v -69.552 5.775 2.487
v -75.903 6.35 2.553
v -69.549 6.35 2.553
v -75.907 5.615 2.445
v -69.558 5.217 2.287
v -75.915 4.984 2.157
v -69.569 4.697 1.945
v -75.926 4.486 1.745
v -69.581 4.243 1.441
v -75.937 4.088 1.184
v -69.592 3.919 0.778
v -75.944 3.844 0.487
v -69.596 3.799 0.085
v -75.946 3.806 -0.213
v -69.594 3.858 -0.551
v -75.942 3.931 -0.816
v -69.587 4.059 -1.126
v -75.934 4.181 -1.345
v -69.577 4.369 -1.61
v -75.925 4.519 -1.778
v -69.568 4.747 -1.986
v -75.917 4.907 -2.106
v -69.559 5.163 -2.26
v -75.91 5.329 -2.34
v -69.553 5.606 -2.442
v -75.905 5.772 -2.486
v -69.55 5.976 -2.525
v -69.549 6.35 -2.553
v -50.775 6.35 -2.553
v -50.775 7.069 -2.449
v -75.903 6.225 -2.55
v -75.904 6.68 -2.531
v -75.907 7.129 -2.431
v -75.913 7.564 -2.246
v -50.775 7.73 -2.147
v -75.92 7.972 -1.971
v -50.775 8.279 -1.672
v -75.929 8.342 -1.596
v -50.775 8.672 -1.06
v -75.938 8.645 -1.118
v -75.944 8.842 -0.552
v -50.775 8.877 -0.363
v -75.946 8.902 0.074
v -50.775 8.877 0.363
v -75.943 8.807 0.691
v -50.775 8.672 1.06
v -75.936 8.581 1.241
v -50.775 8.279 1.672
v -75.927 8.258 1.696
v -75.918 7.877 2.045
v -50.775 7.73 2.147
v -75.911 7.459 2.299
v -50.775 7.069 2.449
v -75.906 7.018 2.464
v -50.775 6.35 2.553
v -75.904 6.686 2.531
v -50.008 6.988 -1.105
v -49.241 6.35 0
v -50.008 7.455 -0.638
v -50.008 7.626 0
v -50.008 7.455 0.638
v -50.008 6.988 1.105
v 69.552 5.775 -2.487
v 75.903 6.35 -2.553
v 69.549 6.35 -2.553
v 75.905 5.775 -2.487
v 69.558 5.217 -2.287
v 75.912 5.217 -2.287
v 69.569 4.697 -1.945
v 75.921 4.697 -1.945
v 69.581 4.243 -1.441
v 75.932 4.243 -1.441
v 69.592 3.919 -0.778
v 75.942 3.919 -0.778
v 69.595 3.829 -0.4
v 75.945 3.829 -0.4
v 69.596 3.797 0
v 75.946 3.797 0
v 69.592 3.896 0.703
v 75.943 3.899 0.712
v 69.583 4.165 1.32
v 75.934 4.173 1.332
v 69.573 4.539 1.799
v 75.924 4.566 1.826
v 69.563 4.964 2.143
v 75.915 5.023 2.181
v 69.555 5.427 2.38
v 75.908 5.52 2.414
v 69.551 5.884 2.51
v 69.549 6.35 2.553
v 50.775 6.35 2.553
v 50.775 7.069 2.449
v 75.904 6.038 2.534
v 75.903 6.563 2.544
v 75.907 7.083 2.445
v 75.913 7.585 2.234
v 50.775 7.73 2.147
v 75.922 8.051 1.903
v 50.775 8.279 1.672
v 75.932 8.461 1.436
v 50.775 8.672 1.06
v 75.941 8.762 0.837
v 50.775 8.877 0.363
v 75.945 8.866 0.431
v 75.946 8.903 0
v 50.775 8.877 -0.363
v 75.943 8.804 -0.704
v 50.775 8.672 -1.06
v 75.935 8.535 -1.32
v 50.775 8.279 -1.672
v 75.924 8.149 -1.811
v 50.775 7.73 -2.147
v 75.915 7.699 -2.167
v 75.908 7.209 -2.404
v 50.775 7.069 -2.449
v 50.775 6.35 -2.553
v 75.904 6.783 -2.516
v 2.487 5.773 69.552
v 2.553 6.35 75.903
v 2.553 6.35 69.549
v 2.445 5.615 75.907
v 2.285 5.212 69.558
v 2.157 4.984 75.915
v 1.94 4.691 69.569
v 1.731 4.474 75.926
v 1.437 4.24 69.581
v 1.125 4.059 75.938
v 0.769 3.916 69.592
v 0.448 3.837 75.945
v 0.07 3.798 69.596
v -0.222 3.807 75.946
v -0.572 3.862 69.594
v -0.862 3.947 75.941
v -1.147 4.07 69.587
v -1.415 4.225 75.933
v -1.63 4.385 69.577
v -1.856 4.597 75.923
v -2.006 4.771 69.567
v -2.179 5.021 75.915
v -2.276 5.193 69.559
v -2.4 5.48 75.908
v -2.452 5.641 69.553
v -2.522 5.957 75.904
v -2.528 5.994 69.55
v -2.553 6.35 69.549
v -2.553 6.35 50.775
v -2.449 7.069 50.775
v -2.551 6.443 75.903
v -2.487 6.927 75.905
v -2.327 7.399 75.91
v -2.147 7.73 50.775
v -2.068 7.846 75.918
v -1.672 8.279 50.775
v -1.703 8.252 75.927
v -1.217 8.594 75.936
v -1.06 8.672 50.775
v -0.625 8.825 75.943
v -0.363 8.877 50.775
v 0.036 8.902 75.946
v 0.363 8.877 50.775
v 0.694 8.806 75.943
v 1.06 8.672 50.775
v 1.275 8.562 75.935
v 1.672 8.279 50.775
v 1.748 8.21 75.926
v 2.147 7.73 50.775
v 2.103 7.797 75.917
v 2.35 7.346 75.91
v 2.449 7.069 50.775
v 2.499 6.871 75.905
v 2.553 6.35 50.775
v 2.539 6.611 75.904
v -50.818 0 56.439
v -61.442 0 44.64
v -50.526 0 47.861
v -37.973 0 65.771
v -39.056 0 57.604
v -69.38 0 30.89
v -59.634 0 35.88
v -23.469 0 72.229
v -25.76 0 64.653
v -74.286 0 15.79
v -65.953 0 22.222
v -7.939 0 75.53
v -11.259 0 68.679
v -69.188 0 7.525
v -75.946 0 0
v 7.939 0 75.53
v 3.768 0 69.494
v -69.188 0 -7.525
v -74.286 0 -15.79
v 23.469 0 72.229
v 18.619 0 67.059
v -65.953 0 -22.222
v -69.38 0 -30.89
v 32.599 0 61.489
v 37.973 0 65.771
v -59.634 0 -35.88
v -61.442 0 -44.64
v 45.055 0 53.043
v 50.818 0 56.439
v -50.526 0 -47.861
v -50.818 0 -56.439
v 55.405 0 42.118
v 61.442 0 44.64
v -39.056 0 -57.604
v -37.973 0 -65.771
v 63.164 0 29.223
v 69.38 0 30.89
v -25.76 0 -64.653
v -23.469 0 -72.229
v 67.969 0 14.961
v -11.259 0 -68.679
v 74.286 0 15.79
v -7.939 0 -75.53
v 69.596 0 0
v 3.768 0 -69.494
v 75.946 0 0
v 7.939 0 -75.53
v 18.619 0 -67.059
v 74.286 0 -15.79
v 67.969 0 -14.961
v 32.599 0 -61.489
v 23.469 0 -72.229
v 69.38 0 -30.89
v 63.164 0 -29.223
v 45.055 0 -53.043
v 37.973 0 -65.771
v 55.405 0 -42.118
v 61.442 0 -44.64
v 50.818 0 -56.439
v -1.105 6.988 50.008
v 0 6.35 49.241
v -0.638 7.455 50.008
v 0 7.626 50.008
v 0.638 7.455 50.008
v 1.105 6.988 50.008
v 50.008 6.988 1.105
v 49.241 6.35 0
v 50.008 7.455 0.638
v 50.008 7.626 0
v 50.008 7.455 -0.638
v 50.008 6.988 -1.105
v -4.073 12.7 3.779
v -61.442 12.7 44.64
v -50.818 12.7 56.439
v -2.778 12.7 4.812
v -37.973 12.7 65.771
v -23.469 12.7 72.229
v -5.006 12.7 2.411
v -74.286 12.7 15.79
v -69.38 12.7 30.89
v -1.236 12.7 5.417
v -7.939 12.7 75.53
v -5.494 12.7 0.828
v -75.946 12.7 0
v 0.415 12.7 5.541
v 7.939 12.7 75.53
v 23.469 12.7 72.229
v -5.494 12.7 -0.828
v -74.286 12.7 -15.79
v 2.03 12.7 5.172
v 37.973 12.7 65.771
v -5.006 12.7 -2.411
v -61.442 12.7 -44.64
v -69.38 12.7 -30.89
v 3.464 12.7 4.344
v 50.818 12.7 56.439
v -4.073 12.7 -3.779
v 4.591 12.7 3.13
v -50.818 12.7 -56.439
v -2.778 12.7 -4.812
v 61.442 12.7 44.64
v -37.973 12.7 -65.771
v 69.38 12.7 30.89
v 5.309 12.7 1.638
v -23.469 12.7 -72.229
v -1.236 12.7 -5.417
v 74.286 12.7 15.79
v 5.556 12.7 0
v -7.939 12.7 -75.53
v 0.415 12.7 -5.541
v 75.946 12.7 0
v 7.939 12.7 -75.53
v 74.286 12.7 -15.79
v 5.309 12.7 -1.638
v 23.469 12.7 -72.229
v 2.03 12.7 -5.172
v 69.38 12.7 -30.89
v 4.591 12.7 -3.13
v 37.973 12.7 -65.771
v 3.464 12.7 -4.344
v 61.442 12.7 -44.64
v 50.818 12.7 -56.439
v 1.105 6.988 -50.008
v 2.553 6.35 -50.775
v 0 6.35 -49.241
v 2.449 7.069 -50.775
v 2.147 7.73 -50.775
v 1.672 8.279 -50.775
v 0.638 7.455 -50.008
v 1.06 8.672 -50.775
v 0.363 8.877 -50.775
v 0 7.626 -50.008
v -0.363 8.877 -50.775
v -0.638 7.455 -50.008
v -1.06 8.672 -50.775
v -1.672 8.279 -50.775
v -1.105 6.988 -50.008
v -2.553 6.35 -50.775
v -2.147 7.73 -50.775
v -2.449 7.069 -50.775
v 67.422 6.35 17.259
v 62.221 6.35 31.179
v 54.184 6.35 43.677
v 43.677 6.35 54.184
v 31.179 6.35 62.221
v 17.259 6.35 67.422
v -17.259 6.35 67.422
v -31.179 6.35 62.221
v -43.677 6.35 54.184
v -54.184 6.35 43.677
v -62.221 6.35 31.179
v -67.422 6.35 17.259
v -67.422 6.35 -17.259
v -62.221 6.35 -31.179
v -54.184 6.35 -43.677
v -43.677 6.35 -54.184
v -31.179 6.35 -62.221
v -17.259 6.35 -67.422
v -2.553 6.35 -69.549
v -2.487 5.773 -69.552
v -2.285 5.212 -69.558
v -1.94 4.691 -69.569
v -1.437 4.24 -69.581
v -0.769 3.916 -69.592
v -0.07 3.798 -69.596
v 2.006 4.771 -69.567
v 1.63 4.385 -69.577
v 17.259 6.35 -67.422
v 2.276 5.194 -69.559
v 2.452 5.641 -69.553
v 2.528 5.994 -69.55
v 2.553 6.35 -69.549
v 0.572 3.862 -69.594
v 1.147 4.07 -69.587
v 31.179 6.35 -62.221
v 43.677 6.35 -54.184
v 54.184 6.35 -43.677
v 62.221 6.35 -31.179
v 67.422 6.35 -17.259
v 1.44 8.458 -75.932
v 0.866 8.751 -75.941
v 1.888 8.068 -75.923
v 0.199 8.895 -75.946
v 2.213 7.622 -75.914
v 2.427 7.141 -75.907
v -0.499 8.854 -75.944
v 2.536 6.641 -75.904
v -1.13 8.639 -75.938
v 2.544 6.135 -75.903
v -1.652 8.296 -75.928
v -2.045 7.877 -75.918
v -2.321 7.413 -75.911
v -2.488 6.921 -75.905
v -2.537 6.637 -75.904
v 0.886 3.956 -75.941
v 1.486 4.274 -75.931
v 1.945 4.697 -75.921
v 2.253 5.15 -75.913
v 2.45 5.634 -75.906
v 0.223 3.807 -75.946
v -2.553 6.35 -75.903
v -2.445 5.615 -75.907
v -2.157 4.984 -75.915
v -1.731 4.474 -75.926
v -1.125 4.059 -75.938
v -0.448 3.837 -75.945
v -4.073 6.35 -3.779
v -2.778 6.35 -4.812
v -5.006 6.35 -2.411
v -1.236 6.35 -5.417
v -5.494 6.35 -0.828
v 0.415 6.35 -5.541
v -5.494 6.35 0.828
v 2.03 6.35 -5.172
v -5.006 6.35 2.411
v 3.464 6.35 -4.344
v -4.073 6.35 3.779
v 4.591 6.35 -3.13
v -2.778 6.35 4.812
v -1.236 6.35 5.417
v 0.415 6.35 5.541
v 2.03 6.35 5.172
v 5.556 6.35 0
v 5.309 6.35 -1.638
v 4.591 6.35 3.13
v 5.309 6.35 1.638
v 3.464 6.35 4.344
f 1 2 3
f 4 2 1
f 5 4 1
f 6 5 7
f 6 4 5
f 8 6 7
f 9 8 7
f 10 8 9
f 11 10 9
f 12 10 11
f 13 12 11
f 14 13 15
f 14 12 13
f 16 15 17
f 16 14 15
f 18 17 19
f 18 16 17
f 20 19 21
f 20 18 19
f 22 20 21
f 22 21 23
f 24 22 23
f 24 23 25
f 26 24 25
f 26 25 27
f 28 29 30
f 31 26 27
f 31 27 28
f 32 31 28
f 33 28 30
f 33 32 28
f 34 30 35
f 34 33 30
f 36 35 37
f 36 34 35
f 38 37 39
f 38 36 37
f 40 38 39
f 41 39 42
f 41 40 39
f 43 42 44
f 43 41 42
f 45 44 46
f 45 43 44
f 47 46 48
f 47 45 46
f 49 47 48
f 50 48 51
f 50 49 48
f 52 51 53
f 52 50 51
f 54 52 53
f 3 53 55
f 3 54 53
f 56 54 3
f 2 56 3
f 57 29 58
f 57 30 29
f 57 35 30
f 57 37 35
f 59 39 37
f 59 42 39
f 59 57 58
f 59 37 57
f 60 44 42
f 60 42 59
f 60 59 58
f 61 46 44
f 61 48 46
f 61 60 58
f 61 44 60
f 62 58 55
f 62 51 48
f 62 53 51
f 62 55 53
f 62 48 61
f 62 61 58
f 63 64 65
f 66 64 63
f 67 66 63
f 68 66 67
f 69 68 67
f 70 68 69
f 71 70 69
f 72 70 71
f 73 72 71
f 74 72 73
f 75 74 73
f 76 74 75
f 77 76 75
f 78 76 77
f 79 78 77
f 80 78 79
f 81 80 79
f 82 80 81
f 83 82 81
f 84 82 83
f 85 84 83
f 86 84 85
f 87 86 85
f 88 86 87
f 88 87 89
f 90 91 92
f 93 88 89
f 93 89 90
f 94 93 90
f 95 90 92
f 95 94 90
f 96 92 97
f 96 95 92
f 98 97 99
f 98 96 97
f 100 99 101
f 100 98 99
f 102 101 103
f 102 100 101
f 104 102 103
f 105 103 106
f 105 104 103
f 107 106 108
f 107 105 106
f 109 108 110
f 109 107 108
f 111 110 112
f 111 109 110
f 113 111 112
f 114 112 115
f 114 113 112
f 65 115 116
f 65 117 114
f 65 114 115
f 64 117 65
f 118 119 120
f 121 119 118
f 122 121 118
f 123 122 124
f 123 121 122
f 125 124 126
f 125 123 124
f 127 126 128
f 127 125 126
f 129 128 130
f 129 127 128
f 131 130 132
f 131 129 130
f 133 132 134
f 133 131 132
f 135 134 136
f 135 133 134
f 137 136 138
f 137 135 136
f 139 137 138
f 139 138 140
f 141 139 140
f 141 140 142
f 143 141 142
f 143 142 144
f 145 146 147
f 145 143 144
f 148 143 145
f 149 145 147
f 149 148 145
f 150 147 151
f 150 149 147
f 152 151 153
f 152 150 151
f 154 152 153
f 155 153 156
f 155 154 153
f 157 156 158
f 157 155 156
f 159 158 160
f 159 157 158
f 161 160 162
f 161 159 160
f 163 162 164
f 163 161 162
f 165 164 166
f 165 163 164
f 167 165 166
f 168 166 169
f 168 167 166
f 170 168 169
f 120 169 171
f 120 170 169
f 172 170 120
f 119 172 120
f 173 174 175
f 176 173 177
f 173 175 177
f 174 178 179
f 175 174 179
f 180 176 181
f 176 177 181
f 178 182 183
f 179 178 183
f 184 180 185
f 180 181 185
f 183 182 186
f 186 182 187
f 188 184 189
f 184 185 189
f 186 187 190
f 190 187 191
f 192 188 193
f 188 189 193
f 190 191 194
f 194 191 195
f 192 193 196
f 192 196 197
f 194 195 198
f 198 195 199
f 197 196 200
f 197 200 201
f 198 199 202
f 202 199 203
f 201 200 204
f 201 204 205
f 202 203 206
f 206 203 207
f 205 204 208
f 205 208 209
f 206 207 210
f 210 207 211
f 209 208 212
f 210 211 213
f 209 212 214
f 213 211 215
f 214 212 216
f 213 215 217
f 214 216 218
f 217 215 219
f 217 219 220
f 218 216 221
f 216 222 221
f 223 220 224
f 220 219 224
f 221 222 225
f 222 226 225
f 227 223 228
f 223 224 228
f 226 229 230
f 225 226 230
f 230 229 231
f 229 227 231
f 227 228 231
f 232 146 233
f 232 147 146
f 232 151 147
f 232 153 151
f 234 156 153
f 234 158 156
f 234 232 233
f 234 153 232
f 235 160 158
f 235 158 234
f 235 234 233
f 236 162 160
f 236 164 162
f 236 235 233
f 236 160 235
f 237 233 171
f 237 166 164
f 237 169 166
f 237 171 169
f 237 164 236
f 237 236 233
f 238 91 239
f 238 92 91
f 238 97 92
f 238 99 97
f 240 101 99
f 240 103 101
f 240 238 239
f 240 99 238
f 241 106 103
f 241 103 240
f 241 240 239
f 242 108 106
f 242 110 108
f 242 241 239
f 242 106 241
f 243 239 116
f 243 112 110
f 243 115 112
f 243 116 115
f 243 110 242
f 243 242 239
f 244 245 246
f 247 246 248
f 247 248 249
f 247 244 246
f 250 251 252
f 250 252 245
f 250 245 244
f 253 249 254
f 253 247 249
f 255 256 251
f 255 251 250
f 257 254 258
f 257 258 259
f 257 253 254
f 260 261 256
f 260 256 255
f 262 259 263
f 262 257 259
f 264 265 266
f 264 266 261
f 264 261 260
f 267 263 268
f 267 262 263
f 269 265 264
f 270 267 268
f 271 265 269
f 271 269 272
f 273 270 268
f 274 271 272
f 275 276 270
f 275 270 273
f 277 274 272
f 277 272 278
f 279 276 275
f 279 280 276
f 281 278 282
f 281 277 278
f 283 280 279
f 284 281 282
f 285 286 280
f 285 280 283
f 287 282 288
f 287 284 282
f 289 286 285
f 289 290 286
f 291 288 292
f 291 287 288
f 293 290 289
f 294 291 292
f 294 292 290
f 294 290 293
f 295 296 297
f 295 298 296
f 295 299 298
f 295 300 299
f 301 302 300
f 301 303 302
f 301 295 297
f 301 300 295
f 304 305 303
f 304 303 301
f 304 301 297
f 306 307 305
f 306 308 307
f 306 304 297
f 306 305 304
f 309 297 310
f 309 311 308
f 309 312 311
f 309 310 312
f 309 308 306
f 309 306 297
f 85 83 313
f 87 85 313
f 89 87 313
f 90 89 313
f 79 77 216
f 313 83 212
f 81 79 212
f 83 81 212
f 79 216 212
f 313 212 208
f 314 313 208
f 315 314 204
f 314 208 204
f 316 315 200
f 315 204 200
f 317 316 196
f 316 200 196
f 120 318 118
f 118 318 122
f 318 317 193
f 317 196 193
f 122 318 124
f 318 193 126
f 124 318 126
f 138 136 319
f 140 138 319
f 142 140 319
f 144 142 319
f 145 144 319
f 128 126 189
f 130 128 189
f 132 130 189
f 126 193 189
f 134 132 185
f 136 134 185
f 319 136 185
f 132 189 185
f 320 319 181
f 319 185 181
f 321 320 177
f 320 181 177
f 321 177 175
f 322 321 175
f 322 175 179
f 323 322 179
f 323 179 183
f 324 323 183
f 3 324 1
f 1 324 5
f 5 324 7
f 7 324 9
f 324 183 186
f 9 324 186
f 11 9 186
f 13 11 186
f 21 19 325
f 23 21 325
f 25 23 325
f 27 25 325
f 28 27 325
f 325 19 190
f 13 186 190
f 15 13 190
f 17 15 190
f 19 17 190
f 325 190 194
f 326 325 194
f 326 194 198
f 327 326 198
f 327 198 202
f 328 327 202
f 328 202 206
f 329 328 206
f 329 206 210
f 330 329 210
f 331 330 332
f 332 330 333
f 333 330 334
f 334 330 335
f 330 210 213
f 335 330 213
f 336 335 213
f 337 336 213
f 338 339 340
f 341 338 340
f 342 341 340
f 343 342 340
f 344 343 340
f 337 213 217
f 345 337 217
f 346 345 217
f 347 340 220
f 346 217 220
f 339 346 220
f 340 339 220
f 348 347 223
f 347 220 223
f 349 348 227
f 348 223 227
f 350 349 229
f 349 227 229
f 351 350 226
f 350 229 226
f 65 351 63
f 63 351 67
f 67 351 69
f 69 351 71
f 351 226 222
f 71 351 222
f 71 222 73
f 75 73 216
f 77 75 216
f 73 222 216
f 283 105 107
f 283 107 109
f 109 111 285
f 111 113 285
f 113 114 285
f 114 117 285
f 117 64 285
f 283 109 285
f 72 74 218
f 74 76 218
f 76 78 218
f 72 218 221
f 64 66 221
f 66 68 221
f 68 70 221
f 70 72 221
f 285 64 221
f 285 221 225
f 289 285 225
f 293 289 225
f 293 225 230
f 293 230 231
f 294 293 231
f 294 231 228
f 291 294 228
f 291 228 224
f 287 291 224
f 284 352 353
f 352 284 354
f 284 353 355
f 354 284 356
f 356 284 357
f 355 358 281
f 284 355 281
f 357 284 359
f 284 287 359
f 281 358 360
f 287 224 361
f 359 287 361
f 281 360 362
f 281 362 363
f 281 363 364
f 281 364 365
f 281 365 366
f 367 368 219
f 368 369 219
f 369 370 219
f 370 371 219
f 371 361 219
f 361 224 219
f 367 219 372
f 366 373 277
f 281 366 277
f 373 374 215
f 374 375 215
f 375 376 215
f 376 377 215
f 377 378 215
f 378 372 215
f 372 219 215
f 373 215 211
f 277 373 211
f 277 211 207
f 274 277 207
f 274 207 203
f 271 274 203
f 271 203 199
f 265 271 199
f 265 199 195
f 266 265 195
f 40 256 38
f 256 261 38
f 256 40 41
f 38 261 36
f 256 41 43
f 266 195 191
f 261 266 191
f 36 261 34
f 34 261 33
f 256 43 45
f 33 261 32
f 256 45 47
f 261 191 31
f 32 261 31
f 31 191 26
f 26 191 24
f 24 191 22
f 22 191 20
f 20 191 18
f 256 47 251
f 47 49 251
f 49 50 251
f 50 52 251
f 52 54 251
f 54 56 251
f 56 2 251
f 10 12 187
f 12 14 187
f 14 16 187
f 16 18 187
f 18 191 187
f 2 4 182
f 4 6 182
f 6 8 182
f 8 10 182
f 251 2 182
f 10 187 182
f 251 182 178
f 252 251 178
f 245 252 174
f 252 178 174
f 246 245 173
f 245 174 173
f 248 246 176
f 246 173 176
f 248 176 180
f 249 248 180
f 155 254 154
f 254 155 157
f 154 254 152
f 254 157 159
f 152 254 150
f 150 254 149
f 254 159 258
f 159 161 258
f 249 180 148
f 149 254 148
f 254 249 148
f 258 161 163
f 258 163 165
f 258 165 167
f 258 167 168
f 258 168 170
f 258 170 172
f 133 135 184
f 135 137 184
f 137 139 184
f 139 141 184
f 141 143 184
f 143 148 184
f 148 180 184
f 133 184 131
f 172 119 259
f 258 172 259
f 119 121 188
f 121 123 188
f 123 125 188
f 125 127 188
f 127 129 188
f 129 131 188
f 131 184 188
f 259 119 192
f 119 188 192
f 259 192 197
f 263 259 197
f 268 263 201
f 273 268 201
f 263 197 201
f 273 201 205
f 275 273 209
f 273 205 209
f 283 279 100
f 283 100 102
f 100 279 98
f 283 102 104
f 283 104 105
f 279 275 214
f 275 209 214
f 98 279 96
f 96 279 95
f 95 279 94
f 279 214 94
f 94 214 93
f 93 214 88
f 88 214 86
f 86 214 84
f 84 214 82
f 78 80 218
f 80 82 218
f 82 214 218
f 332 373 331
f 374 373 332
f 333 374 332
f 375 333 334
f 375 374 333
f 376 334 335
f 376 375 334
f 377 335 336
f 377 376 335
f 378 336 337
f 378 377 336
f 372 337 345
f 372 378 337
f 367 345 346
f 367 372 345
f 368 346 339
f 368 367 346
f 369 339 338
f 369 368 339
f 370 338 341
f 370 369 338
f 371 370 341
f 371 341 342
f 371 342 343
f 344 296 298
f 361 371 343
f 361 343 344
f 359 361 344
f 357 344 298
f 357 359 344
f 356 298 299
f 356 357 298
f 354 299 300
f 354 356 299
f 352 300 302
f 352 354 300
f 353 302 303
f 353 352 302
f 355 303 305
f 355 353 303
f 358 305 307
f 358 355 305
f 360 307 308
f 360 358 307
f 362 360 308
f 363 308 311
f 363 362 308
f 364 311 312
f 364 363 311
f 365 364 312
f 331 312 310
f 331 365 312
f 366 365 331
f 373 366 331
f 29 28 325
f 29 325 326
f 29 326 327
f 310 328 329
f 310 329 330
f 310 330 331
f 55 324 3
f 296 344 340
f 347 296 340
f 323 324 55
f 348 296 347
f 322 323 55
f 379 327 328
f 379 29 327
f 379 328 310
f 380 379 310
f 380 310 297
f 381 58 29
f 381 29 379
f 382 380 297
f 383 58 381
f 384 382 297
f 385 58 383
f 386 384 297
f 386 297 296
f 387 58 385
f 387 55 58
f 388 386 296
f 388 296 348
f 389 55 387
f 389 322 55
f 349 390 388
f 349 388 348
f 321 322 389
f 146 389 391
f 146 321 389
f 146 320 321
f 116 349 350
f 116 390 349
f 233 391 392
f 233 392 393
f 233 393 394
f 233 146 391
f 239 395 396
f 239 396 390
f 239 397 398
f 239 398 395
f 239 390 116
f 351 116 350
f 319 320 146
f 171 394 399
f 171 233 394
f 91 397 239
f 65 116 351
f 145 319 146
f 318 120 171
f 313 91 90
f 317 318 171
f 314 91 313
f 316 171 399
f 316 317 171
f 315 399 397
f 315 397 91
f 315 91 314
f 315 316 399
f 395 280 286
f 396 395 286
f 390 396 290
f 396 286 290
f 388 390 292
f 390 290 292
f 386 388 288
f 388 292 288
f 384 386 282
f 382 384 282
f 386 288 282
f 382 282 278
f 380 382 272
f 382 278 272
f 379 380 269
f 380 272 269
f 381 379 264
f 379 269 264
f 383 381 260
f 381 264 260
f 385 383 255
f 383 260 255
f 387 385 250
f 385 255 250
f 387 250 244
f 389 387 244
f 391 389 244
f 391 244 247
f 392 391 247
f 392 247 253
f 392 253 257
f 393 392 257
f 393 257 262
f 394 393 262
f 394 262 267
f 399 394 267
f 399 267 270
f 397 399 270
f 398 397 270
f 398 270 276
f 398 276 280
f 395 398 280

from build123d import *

# Parameters (mm, degrees)
SKETCH2_R               = 75.946
BOSS_EXTRUDE1_DEPTH     = 12.7
SKETCH3_R               = 5.55625
CUT_EXTRUDE1_DEPTH      = 1
CUT_EXTRUDE1_DEPTH_BACK = 13.7
CIRPATTERN2_COUNT       = 4
CIRPATTERN2_ANGLE       = 270
SKETCH11_R              = 69.596
CUT_EXTRUDE2_DEPTH      = 6.35


with BuildPart() as part:
    # Sketch2 → Boss-Extrude1 (new body)
    with BuildSketch(Plane(origin=(0, 0, 0), x_dir=(1, 0, 0), z_dir=(0, 1, 0))):
        Circle(SKETCH2_R)
    extrude(amount=BOSS_EXTRUDE1_DEPTH)

    # Sketch3 → Cut-Extrude1 (cut, two sides)
    with BuildSketch(Plane(origin=(0, 12.7, 0), x_dir=(1, 0, 0), z_dir=(0, 1, 0))) as cut_extrude1_sk:
        Circle(SKETCH3_R)
    extrude(amount=CUT_EXTRUDE1_DEPTH, mode=Mode.SUBTRACT)
    extrude(cut_extrude1_sk.sketch, amount=-CUT_EXTRUDE1_DEPTH_BACK, mode=Mode.SUBTRACT)

    # Sketch10 → 1_4-20 Tapped Hole1 (revolve, cut)
    with BuildSketch(Plane(origin=(-76.1746, 6.35, 0), x_dir=(0, 0, 1), z_dir=(0, 1, 0))):
        Polygon((0, 0), (0, 26.933816902), (2.5527, 25.4), (2.5527, 0), align=None)
    f_1_4_20_tapped_hole1 = revolve(axis=Axis((-82.5246, 6.35, 0), (1, 0, 0)), mode=Mode.SUBTRACT)

    # CirPattern2: 1_4-20 Tapped Hole1 ×4 about axis
    cirpattern2_axis = Axis((0, 12.7, 0), (0, -1, 0))
    for i in range(1, CIRPATTERN2_COUNT):
        add(f_1_4_20_tapped_hole1.rotate(cirpattern2_axis, i * CIRPATTERN2_ANGLE / (CIRPATTERN2_COUNT - 1)), mode=Mode.SUBTRACT)

    # Sketch11 → Cut-Extrude2 (cut)
    with BuildSketch(Plane.XZ):
        Circle(SKETCH11_R)
    extrude(amount=-CUT_EXTRUDE2_DEPTH, mode=Mode.SUBTRACT)


solid = part.part
